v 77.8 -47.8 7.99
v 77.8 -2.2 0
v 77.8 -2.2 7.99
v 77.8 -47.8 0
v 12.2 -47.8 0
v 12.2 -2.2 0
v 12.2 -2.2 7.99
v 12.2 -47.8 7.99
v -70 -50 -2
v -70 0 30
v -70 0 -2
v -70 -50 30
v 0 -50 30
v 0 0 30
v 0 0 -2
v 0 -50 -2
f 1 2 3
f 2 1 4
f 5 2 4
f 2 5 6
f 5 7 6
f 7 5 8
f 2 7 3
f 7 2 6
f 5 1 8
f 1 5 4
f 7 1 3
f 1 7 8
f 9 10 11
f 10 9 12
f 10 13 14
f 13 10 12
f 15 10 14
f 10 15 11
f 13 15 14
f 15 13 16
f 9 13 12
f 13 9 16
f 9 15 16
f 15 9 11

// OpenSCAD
// Two-part enclosure for a small electronics board (e.g. Arduino-based temperature logger)
// Print orientation: both parts rest on the bed (z = 0), build upward, side by side.
// The lid is printed upside down: a flat plate on the bed with a lip that drops into the box.

// ---------------- Parameters ----------------
box_x      = 70;    // box outer length (X)
box_y      = 50;    // box outer width (Y)
box_z      = 30;    // box outer height (Z)
wall       = 2;     // box wall thickness (sides and floor)
floor      = 2;     // box floor thickness (separate from side walls for clarity)

lip_t      = 1.5;   // lid lip thickness (the wall of the lip)
lip_h      = 4;     // lid lip height (extends above the box opening)
lip_x      = 65.6;  // outer length of the lip (X)
lip_y      = 45.6;  // outer width of the lip (Y)
clearance  = 0.2;   // gap between lip outer size and box opening on each side

gap        = 10;    // bed gap between the two parts (X direction)
overlap    = 0.01;  // small overlap so the lip fuses into the plate

$fn = 64;

// ---------------- Derived ----------------
inner_x = box_x - 2 * wall;   // box opening length
inner_y = box_y - 2 * wall;   // box opening width
plate_t = 2;                  // base plate thickness under the lip

// ---------------- Model ----------------
union() {
    // Part 1: Box (open top)
    translate([-box_x / 2, -box_y / 2, 0])
        hull() {
            // Floor
            translate([-box_x / 2, -box_y / 2, -floor])
                cube([box_x, box_y, floor]);
            // Side walls (extend above the open top)
            translate([-box_x / 2, -box_y / 2, box_z - wall])
                cube([box_x, box_y, wall]);
        }

    // Part 2: Lid, printed upside down
    translate([box_x / 2 + gap, -box_y / 2, 0])
        union() {
            // Base plate lying on the bed
            translate([-lip_x / 2, -lip_y / 2, 0])
                cube([lip_x, lip_y, plate_t]);
            // Lip: a wall of thickness lip_t, height lip_h, centred on the plate.
            // Its outer size is 65.6 x 45.6, so it slides into the 68 x 46 opening
            // with 0.2 mm clearance on each side.
            translate([-lip_x / 2, -lip_y / 2, plate_t - overlap])
                cube([lip_x, lip_y, plate_t + lip_h]);
        }
}
